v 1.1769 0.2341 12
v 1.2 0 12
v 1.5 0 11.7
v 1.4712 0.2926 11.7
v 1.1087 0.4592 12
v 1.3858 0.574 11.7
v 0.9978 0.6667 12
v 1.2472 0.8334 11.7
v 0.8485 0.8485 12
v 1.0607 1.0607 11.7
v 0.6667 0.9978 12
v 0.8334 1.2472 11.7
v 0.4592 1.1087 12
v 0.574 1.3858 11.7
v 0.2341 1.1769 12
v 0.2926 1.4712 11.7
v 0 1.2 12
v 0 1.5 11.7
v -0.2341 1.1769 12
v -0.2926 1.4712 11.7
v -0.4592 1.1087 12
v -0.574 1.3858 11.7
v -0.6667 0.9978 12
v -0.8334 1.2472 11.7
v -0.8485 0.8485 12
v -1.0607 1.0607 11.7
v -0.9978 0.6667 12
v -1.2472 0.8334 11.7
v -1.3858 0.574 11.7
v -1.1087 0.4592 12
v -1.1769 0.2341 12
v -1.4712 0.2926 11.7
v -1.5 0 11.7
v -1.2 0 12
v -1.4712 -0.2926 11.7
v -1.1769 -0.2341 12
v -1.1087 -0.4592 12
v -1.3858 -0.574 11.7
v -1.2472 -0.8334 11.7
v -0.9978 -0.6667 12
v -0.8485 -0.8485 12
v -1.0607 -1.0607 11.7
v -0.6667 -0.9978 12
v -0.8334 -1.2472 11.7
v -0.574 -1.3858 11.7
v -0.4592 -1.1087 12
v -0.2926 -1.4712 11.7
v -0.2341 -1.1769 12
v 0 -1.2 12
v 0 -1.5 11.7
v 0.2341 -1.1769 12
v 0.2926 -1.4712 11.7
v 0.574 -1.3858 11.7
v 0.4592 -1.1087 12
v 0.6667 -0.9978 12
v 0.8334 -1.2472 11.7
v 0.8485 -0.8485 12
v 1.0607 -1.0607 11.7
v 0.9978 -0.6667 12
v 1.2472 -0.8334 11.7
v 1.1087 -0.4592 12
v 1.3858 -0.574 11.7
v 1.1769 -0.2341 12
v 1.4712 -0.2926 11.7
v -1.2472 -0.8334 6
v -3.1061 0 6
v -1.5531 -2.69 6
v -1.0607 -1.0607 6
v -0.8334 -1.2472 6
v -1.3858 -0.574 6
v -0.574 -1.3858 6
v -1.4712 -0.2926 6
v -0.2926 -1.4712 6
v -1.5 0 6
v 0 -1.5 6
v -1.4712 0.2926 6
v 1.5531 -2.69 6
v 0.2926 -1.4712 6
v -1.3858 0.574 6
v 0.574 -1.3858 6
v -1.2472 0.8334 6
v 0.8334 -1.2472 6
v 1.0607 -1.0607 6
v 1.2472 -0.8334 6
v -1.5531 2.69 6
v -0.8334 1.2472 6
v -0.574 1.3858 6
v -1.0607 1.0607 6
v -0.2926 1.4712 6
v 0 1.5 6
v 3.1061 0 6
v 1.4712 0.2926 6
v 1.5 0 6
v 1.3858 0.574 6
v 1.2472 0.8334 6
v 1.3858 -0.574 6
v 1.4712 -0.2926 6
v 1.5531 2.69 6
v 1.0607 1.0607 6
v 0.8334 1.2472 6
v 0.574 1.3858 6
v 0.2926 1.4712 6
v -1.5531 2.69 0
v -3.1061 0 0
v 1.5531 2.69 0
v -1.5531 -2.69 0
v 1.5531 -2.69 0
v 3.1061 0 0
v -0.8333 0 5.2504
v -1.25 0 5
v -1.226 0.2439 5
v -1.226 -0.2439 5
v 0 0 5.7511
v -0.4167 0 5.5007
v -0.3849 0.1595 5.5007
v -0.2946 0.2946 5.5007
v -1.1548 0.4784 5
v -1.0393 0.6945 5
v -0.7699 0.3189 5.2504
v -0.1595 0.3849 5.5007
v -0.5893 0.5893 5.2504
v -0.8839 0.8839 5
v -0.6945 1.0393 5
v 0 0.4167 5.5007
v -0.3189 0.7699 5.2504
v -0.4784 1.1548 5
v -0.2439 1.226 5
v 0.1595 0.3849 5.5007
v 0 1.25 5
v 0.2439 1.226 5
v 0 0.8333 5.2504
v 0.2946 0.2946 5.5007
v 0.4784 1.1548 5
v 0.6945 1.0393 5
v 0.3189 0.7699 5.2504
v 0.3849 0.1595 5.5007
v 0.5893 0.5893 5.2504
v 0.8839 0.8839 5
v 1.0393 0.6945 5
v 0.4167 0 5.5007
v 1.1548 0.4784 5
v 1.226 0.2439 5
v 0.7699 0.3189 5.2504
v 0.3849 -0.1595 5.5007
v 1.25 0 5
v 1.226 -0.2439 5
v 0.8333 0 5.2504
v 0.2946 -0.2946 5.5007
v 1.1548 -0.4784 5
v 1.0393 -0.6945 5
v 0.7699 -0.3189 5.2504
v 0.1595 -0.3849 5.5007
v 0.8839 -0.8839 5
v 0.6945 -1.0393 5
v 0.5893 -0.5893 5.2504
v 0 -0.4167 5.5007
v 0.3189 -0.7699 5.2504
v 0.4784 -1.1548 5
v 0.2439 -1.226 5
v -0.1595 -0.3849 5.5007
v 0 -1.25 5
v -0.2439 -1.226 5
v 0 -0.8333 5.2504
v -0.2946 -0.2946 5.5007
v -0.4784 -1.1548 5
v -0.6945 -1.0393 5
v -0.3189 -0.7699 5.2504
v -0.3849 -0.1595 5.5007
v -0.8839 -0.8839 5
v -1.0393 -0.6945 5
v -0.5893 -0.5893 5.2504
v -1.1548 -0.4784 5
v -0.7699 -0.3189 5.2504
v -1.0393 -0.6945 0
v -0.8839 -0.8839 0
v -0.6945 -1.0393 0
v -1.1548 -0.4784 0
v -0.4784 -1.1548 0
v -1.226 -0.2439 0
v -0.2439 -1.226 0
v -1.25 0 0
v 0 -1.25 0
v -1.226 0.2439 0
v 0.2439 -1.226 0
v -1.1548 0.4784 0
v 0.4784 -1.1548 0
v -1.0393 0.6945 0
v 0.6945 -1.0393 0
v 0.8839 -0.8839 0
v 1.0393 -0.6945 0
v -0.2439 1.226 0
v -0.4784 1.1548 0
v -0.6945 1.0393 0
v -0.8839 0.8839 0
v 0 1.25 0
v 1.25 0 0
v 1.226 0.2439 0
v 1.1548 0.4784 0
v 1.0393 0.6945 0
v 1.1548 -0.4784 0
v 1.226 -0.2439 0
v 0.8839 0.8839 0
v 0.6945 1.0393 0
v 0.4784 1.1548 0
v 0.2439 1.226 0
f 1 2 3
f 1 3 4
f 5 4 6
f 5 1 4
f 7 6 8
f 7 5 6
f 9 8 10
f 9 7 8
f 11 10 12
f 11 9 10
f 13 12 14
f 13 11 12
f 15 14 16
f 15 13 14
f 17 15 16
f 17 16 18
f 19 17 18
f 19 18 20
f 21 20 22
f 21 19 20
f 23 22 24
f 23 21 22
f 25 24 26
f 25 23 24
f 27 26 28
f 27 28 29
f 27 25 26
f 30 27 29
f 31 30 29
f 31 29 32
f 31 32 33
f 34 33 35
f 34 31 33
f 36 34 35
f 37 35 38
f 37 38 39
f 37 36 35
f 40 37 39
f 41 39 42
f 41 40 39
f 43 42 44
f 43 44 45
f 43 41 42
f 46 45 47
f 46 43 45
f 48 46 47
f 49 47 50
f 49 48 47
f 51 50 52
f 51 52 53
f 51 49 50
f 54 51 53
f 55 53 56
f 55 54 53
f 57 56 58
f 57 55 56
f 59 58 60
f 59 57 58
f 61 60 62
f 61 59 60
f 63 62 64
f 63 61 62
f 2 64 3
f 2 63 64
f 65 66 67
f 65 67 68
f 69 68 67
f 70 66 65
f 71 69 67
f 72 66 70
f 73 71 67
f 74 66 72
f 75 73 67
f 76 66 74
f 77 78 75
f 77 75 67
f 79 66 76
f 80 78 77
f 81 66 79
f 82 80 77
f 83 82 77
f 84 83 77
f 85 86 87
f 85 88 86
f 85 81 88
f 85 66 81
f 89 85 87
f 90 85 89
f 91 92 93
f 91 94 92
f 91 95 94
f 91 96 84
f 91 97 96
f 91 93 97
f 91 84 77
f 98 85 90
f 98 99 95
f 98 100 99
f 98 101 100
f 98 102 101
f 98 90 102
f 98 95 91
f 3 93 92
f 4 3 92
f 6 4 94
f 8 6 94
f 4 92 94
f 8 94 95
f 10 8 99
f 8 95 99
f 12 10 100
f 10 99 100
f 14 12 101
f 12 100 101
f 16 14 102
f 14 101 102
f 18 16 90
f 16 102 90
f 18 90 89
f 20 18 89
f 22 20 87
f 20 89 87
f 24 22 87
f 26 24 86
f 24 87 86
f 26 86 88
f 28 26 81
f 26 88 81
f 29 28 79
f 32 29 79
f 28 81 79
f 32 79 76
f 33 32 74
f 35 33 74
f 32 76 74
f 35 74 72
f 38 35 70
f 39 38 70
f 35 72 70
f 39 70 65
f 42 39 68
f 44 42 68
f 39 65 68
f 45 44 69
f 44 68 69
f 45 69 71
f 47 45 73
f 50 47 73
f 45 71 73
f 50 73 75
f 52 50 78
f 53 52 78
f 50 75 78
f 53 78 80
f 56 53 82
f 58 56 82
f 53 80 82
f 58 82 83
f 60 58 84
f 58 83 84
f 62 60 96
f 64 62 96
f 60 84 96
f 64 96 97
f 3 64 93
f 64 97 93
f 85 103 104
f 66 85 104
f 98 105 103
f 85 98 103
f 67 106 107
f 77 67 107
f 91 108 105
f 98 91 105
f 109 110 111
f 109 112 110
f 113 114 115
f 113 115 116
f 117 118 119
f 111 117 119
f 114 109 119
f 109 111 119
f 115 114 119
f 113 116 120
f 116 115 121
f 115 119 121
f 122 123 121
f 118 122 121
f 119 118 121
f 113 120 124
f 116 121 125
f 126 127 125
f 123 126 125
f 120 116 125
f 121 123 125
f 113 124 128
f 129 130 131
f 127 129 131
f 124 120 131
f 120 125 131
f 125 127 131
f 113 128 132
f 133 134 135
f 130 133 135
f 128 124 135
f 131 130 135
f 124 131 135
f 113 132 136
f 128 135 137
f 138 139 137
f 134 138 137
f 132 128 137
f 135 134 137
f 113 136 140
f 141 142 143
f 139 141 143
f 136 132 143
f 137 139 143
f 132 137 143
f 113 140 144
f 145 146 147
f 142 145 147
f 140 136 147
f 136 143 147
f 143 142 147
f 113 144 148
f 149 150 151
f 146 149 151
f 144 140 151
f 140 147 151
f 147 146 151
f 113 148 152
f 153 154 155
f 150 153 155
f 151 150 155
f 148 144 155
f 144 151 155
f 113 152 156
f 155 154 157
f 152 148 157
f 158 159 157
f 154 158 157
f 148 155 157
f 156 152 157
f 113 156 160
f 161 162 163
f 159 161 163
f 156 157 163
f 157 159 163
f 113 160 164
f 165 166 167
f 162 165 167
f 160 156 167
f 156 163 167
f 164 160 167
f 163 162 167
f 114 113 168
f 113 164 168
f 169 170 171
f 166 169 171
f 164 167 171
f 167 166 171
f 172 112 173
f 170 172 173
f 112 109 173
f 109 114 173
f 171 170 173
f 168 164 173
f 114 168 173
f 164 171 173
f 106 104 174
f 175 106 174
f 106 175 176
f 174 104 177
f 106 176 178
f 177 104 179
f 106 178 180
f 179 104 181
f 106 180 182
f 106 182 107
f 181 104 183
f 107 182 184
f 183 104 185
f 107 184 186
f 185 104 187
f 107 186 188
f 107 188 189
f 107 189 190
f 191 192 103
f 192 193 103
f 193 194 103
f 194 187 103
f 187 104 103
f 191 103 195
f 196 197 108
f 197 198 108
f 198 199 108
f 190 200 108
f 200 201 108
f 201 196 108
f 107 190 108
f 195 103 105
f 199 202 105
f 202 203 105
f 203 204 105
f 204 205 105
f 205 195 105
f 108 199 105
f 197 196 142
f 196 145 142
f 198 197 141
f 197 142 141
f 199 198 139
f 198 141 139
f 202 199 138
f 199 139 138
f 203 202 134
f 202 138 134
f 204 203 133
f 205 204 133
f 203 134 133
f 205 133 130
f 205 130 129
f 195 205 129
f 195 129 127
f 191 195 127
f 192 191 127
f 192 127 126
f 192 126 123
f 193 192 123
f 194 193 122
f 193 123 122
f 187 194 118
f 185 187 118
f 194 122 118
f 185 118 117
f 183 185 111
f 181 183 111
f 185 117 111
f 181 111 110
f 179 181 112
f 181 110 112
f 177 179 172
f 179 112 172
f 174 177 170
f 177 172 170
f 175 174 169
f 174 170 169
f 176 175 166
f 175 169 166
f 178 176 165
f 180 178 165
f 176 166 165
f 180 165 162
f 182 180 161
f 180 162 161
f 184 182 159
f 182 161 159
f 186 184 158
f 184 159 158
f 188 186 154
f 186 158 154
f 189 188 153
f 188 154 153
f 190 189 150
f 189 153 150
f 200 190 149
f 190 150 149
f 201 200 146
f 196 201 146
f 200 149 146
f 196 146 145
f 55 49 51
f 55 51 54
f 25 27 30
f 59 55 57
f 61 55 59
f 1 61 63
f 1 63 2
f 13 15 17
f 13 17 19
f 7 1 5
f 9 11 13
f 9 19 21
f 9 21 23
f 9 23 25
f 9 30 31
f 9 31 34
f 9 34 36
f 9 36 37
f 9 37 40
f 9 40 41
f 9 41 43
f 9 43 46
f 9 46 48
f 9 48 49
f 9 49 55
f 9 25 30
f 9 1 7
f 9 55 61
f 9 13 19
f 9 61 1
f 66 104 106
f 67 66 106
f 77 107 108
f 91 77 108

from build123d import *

# Parameters (mm, degrees)
EXTRUDE_1_DEPTH        = 6
SKETCH_2_R             = 1.5
EXTRUDE_2_DEPTH        = 6
HOLE_WIZARD_M3_1_D     = 2.5
HOLE_WIZARD_M3_1_DEPTH = 5
HOLE_WIZARD_M3_1_TIP   = 0.751075774
CHAMFER_1_SIZE         = 0.3


with BuildPart() as part:
    # 草图1 → 凸台-拉伸1 (new body)
    with BuildSketch(Plane.XY):
        Polygon((-1.553072224, 2.69), (-3.106144448, 0), (-1.553072224, -2.69), (1.553072224, -2.69), (3.106144448, 0), (1.553072224, 2.69), align=None)
    extrude(amount=EXTRUDE_1_DEPTH)

    # 草图2 → 凸台-拉伸2 (add)
    with BuildSketch(Plane.XY.offset(6)):
        Circle(SKETCH_2_R)
    extrude(amount=EXTRUDE_2_DEPTH)

    # M3 螺纹孔1
    with Locations(Plane(origin=(0, 0, 0), x_dir=(-1, 0, 0), z_dir=(0, 0, -1))):
        with Locations((0, 0)):
            Hole(HOLE_WIZARD_M3_1_D / 2, depth=HOLE_WIZARD_M3_1_DEPTH)
            with Locations((0, 0, -(HOLE_WIZARD_M3_1_DEPTH + HOLE_WIZARD_M3_1_TIP / 2))):  # 118° drill point
                Cone(0, HOLE_WIZARD_M3_1_D / 2, HOLE_WIZARD_M3_1_TIP, mode=Mode.SUBTRACT)

    # 倒角1
    chamfer_1_edges = [part.edges().sort_by_distance(p)[0] for p in [
        (-1.5, 0, 12),
    ]]
    chamfer(chamfer_1_edges, length=CHAMFER_1_SIZE)


solid = part.part
